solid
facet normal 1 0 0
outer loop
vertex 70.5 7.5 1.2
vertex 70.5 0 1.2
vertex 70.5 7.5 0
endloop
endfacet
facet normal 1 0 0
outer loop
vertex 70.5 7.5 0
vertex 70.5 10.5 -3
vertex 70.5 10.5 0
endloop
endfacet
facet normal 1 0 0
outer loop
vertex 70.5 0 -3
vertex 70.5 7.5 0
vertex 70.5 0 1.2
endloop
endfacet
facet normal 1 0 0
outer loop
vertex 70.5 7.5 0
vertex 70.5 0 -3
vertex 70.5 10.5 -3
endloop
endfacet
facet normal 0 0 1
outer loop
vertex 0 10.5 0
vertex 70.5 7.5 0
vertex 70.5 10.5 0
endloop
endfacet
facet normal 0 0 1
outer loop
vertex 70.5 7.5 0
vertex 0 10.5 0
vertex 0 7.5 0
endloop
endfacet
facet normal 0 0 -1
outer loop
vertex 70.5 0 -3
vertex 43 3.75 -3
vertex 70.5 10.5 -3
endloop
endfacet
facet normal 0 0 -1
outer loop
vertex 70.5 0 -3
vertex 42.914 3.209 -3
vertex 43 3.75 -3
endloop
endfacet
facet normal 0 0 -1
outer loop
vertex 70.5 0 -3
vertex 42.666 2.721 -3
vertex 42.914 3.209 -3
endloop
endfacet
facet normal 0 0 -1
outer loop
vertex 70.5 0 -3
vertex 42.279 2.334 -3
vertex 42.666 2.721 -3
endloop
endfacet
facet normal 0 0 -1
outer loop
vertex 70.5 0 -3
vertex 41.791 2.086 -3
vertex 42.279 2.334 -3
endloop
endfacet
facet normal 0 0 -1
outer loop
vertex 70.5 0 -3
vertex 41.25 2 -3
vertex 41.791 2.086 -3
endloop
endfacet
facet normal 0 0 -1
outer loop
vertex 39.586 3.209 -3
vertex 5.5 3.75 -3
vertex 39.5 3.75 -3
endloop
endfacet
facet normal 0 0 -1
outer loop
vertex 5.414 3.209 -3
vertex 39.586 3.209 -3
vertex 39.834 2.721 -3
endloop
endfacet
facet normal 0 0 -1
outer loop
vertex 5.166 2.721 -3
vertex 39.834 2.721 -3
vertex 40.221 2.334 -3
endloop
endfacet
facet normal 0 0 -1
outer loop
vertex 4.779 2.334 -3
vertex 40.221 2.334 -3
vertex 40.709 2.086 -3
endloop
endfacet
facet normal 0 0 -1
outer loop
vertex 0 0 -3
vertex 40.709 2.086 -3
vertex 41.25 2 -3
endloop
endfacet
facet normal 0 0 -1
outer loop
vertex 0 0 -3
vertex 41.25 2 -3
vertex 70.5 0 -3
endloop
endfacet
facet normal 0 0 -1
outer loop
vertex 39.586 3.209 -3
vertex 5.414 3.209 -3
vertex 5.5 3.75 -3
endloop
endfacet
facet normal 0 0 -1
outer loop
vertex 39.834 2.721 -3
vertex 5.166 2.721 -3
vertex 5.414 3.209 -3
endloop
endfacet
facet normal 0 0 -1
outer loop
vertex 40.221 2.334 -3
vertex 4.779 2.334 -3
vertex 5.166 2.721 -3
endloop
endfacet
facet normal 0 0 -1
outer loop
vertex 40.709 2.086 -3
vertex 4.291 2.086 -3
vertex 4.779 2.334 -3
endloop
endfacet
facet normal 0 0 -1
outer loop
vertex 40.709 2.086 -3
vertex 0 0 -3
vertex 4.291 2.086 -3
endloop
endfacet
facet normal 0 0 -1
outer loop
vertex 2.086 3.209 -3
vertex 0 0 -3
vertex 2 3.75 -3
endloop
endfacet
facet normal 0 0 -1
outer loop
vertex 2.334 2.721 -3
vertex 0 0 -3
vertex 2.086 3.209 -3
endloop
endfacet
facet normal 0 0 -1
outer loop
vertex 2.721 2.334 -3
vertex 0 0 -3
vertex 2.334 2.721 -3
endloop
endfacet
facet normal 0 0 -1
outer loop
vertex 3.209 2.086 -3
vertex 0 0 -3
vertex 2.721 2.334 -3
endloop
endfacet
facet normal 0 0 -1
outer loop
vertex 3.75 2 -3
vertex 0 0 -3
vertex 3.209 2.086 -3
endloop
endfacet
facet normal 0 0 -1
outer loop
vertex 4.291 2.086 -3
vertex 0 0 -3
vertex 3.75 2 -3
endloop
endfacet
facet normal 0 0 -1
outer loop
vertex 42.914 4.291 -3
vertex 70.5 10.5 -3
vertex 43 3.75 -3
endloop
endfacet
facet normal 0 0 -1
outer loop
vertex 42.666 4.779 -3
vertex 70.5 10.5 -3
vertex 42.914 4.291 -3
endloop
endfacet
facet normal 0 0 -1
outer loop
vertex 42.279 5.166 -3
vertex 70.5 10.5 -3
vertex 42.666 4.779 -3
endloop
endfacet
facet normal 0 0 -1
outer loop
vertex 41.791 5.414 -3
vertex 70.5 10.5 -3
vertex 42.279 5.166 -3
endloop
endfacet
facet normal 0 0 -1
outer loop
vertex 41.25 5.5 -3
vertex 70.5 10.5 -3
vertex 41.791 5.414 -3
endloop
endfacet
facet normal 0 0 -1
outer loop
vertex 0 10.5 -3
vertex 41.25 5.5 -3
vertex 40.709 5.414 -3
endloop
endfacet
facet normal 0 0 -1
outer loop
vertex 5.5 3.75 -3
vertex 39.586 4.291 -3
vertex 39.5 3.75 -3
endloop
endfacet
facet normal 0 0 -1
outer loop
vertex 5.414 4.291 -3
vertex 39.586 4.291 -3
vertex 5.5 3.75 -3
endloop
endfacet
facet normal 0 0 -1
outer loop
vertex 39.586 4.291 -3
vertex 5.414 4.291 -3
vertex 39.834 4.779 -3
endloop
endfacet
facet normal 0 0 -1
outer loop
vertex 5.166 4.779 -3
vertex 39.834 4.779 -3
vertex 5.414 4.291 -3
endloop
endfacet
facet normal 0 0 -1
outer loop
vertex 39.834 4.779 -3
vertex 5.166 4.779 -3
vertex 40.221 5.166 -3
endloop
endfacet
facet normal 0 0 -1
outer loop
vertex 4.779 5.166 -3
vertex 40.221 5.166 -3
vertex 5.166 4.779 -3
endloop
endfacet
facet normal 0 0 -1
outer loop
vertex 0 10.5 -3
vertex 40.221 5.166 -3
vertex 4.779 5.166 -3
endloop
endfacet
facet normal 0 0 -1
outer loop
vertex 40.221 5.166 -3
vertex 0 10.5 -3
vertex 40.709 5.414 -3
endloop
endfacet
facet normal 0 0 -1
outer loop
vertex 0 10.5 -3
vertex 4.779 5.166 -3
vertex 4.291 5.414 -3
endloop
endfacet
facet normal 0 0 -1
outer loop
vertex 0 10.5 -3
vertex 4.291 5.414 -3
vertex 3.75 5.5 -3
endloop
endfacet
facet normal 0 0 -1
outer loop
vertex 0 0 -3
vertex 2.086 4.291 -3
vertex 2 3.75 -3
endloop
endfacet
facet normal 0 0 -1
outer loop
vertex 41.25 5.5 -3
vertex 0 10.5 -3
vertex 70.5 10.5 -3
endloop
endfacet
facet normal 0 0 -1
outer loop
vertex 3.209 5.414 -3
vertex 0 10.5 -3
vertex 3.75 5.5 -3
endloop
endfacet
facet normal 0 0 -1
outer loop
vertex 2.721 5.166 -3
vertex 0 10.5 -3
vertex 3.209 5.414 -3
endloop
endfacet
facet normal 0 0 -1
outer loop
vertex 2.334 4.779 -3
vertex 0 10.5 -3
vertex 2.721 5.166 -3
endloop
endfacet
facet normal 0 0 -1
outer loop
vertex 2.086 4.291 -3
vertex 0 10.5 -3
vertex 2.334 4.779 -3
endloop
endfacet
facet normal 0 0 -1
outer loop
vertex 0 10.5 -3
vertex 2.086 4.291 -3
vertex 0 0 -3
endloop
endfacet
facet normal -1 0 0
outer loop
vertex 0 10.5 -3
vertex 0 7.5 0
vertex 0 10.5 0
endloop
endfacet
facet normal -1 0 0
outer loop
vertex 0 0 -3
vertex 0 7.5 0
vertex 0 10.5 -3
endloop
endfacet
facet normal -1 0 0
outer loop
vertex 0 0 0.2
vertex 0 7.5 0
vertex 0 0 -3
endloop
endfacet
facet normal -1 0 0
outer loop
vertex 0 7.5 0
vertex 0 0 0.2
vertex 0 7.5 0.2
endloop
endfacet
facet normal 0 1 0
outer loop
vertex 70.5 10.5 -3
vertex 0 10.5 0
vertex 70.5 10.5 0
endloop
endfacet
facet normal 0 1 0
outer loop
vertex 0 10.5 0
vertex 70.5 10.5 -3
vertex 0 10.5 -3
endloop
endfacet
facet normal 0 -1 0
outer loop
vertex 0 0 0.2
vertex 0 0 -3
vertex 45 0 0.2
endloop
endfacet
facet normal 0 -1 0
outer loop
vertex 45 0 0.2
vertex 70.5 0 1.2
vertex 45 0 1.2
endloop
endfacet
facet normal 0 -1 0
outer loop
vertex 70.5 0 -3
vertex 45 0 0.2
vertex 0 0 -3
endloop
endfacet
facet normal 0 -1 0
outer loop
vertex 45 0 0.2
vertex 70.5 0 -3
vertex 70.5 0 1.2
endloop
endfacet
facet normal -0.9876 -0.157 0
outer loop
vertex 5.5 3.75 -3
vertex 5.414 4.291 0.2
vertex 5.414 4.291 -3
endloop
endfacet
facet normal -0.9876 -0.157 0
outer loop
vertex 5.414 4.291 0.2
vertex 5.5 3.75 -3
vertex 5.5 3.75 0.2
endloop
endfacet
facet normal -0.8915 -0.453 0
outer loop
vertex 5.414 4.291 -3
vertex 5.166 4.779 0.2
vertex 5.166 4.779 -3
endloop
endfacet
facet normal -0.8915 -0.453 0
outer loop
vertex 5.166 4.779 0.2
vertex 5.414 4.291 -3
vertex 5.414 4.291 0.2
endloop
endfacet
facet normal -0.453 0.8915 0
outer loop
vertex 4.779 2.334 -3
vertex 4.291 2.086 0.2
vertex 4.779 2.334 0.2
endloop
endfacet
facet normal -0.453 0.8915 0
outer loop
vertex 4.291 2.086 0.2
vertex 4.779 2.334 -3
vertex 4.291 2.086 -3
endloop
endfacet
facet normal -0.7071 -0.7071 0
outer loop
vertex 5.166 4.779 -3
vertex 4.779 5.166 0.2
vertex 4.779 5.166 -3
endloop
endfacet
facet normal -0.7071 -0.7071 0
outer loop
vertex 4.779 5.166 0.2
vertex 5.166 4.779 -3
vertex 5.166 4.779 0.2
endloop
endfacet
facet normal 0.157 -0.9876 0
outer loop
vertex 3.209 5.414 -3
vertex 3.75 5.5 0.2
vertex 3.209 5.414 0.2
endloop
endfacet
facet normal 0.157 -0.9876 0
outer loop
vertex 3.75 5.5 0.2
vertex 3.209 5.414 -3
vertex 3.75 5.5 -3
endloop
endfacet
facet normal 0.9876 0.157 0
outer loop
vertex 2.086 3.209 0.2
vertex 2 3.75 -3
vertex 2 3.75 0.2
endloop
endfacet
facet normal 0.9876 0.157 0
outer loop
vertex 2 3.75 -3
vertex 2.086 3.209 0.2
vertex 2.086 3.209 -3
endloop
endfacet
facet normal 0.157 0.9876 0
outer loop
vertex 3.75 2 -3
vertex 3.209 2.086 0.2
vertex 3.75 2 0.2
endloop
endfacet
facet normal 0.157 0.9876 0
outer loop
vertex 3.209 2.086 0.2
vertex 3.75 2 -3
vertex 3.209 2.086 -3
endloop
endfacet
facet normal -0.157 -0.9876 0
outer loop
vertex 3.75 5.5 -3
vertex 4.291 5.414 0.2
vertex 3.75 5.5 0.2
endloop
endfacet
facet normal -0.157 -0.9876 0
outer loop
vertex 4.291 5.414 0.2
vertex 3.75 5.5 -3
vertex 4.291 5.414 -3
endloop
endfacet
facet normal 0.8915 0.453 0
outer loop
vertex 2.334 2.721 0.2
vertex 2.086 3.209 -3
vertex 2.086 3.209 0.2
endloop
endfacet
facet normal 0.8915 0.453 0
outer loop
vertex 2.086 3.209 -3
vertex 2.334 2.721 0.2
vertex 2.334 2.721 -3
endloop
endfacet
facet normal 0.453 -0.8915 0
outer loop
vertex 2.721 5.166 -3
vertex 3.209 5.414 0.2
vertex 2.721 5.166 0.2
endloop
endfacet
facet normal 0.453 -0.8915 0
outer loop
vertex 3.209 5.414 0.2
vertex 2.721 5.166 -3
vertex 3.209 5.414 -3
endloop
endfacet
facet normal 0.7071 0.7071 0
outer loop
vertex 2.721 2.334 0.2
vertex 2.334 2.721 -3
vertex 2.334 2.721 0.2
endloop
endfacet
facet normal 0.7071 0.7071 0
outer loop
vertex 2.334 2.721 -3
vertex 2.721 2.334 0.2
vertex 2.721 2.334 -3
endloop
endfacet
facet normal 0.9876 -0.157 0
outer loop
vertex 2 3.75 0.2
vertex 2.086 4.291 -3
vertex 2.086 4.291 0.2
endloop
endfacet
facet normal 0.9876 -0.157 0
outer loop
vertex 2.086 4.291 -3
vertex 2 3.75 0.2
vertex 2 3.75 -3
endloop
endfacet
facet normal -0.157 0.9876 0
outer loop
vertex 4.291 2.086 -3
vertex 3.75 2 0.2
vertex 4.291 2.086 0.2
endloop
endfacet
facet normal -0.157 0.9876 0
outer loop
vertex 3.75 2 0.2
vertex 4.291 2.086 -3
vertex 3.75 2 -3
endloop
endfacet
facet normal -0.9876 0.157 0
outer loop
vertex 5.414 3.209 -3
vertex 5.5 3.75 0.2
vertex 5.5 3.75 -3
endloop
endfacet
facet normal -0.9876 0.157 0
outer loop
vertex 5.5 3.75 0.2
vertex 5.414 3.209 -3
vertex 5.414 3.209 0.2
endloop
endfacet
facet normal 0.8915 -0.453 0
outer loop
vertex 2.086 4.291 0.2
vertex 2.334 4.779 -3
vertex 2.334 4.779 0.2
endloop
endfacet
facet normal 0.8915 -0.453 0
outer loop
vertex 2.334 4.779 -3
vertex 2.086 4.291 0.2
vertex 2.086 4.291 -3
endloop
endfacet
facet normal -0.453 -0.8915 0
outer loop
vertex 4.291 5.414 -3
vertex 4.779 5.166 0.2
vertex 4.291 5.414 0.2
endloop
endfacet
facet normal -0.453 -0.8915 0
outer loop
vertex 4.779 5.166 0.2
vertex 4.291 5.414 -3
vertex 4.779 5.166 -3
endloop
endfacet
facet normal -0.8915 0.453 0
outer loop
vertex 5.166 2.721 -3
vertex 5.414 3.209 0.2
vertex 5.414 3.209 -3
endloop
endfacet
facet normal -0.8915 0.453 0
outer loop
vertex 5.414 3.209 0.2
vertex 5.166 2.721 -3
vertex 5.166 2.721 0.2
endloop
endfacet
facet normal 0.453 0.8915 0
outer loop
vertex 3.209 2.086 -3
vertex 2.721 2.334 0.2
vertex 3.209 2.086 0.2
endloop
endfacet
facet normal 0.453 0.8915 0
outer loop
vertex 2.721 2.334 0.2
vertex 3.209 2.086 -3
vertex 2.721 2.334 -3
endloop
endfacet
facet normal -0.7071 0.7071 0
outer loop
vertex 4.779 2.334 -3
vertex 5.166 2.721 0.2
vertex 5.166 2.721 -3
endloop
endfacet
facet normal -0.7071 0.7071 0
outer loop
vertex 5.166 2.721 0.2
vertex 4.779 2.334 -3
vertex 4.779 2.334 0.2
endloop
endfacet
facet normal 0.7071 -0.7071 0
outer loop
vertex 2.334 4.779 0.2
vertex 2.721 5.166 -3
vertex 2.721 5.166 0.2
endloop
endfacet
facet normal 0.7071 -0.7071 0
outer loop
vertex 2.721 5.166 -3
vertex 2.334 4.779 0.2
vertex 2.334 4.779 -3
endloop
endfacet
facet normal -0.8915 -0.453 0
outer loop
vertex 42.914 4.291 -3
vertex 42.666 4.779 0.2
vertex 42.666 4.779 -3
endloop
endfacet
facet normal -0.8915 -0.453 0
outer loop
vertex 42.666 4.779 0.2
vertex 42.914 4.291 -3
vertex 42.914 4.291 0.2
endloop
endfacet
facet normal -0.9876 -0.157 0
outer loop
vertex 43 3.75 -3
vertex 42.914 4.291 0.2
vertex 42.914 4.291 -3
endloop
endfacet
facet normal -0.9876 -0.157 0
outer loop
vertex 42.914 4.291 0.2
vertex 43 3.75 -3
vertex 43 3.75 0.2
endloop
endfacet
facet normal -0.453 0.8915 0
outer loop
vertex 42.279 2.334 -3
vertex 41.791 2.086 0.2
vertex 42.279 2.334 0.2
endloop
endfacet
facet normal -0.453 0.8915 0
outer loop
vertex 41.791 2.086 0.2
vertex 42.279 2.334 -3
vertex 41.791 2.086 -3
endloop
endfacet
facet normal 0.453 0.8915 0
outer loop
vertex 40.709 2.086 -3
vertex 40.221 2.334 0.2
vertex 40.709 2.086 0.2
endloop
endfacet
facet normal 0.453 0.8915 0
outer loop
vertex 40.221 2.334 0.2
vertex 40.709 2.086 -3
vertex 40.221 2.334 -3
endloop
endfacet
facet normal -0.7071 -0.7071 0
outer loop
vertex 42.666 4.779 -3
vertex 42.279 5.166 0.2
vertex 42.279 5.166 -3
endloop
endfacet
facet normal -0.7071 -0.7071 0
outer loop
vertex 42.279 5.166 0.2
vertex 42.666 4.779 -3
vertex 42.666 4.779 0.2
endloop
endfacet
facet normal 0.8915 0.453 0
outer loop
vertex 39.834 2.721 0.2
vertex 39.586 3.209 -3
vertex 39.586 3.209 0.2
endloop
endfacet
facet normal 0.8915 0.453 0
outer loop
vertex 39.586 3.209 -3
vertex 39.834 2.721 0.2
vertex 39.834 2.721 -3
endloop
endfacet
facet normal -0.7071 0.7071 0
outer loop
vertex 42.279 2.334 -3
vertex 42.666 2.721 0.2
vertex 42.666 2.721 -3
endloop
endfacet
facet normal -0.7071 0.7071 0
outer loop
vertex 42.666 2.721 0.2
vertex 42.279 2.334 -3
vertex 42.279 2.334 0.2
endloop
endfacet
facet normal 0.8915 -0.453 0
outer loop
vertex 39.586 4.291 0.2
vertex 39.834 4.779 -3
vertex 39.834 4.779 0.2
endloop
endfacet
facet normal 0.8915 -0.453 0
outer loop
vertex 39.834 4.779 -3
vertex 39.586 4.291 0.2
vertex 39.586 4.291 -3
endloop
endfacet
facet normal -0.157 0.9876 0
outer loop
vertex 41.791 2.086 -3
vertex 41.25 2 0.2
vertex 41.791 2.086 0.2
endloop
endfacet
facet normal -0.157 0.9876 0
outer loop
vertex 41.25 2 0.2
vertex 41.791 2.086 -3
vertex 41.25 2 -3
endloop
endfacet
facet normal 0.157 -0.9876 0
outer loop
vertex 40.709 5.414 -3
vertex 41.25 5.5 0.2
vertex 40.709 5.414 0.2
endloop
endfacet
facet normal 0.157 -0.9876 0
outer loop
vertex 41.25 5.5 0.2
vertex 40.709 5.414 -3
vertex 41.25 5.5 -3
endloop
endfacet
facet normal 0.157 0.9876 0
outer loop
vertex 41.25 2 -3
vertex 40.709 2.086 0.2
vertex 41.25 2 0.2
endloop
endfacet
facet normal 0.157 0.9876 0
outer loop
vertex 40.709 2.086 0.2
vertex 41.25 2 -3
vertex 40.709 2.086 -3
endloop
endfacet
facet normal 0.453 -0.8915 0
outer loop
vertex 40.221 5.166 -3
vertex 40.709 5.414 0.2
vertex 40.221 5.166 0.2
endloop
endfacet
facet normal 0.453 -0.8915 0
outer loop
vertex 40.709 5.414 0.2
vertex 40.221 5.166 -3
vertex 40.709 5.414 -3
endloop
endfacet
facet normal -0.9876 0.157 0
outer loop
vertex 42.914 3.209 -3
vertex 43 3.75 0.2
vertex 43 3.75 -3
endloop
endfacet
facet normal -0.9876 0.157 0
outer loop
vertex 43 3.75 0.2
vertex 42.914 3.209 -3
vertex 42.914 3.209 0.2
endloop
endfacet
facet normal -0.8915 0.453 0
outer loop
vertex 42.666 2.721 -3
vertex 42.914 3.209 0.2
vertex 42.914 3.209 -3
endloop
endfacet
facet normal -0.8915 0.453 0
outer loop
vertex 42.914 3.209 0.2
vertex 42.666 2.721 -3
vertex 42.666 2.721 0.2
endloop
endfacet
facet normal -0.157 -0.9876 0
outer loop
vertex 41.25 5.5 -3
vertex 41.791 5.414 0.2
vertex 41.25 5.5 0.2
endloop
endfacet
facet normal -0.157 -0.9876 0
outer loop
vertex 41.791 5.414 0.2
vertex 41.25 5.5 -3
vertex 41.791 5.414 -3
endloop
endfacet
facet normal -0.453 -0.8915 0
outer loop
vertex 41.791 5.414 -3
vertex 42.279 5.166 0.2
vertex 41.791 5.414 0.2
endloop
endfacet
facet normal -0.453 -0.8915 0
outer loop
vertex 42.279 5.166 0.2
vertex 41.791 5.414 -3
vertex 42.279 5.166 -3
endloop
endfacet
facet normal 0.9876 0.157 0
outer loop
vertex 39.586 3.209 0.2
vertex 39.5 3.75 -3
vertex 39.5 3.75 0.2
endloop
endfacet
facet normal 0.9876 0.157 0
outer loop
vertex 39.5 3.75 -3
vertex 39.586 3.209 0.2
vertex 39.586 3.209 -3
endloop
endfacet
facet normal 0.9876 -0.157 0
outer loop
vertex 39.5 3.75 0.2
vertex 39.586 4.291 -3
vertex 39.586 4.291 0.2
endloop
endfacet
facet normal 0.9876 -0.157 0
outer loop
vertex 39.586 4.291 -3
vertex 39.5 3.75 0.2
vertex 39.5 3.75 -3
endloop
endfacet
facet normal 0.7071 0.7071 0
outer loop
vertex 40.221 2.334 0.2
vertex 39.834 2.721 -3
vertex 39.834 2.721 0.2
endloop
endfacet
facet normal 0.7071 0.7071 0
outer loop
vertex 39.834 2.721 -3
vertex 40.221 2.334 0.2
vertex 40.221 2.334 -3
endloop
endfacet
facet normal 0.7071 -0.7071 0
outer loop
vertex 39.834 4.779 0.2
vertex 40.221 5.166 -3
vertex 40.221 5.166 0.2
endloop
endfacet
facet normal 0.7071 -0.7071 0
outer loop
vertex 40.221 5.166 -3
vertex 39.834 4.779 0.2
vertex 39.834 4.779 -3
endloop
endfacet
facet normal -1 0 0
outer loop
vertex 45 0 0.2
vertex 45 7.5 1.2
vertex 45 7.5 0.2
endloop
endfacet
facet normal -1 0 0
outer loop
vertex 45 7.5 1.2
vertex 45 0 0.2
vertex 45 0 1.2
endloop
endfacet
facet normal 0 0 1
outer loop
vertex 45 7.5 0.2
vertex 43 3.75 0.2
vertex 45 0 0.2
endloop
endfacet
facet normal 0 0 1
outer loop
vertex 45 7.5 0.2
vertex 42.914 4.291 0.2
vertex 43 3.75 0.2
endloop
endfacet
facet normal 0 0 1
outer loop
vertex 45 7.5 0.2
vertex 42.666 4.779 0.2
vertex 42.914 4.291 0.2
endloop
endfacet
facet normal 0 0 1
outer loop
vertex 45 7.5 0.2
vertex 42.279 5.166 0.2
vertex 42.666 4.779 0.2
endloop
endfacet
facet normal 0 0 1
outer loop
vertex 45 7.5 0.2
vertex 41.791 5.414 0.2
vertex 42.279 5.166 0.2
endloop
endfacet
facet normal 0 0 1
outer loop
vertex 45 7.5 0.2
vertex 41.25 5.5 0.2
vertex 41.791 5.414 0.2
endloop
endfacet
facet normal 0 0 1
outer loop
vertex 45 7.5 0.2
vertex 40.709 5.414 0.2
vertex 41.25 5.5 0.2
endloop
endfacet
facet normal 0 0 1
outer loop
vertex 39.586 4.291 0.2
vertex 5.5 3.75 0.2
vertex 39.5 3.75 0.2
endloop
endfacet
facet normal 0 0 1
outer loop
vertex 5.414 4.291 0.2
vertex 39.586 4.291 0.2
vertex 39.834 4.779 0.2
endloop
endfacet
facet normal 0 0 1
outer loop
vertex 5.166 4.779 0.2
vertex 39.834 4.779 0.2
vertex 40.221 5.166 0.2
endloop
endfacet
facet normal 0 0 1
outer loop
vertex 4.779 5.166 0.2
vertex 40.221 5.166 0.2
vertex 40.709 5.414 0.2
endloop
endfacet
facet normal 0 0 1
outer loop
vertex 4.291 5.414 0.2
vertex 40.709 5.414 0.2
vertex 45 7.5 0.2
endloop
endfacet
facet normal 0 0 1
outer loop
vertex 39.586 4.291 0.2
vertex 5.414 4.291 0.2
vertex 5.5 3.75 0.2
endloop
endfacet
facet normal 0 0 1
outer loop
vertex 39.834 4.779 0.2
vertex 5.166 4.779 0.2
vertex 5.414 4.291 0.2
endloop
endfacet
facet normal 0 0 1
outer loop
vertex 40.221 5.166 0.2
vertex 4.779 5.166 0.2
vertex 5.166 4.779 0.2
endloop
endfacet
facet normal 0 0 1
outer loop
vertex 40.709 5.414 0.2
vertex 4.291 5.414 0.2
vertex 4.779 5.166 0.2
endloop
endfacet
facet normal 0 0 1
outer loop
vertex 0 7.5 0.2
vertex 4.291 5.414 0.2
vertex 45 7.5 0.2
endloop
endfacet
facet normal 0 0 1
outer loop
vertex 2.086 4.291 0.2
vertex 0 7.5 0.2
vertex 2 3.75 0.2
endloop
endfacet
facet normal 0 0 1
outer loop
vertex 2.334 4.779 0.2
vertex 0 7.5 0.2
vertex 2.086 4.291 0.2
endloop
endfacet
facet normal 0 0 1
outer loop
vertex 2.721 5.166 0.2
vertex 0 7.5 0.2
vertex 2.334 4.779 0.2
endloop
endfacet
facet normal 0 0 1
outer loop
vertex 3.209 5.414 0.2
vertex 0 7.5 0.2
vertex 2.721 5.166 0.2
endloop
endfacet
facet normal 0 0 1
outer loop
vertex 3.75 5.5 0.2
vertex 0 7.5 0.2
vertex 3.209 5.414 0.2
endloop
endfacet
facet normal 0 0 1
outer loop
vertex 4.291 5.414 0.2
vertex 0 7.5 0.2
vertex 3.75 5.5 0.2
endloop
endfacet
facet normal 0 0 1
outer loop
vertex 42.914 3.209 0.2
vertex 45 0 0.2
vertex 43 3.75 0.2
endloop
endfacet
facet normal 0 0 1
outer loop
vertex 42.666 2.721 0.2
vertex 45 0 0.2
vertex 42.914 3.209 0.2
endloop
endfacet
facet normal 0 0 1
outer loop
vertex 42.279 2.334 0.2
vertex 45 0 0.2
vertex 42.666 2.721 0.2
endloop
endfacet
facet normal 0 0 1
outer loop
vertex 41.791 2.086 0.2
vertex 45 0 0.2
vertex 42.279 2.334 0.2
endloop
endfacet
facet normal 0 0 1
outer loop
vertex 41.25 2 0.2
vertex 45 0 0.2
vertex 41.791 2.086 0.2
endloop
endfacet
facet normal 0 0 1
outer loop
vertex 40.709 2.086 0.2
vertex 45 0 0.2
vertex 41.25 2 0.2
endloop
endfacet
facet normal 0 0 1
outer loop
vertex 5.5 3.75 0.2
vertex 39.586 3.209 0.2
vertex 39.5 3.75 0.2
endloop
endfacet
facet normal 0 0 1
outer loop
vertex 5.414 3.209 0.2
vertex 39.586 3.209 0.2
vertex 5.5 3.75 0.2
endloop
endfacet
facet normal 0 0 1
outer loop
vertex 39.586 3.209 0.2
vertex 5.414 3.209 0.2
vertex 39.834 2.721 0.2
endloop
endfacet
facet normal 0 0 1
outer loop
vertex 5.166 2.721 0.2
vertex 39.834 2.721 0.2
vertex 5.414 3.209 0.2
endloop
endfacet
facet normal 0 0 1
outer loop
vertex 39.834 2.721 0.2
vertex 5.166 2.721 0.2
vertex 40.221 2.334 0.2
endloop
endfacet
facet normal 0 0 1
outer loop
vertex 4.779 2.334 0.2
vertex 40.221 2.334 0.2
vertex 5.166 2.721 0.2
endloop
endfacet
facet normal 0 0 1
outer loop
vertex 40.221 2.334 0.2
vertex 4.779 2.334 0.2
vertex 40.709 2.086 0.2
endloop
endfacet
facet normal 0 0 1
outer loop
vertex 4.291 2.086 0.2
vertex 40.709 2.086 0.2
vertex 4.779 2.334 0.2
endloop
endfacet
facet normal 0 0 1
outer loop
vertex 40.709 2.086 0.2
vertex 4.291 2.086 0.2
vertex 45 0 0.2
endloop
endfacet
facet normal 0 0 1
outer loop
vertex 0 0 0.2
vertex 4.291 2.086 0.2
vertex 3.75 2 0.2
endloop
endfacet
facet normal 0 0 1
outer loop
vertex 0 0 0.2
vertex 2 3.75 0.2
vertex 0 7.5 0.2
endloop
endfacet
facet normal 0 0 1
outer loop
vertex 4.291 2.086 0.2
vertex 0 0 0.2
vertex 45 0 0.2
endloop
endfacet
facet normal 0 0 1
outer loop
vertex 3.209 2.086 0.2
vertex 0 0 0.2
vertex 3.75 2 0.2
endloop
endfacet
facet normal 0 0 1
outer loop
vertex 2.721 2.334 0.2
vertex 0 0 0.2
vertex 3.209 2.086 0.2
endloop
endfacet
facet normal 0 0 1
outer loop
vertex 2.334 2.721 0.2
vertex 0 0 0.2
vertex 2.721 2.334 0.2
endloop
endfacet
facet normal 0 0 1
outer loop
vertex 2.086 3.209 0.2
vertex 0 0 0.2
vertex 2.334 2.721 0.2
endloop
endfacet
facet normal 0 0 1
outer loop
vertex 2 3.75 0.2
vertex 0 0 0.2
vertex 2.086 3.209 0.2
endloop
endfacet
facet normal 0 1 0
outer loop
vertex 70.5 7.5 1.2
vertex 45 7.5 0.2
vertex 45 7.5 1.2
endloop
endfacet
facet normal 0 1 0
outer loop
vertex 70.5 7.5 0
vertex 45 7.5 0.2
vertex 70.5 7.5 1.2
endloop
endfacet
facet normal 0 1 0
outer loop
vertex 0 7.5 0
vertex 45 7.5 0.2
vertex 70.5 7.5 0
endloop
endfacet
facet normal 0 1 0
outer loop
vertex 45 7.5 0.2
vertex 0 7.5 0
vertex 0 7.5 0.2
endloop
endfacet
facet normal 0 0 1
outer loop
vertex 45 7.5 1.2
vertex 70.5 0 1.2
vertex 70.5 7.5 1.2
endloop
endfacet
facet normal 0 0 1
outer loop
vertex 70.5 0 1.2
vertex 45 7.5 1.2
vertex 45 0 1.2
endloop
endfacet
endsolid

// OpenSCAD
translate([45,0,0]) cube(size = [25.5,7.5,1.2]);

difference() {
    translate([0,0,-3]) cube(size = [70.5,10.5,3]);
    translate([3.75,3.75,-3]) cylinder(h = 20, r = 1.75, $fn=20);
    translate([41.25,3.75,-3]) cylinder(h = 20, r = 1.75, $fn=20);
}

difference() {
    cube(size = [45,7.5,0.2]);
    translate([3.75,3.75,0]) cylinder(h = 20, r = 1.75, $fn=20);
    translate([41.25,3.75,0]) cylinder(h = 20, r = 1.75, $fn=20);
}
